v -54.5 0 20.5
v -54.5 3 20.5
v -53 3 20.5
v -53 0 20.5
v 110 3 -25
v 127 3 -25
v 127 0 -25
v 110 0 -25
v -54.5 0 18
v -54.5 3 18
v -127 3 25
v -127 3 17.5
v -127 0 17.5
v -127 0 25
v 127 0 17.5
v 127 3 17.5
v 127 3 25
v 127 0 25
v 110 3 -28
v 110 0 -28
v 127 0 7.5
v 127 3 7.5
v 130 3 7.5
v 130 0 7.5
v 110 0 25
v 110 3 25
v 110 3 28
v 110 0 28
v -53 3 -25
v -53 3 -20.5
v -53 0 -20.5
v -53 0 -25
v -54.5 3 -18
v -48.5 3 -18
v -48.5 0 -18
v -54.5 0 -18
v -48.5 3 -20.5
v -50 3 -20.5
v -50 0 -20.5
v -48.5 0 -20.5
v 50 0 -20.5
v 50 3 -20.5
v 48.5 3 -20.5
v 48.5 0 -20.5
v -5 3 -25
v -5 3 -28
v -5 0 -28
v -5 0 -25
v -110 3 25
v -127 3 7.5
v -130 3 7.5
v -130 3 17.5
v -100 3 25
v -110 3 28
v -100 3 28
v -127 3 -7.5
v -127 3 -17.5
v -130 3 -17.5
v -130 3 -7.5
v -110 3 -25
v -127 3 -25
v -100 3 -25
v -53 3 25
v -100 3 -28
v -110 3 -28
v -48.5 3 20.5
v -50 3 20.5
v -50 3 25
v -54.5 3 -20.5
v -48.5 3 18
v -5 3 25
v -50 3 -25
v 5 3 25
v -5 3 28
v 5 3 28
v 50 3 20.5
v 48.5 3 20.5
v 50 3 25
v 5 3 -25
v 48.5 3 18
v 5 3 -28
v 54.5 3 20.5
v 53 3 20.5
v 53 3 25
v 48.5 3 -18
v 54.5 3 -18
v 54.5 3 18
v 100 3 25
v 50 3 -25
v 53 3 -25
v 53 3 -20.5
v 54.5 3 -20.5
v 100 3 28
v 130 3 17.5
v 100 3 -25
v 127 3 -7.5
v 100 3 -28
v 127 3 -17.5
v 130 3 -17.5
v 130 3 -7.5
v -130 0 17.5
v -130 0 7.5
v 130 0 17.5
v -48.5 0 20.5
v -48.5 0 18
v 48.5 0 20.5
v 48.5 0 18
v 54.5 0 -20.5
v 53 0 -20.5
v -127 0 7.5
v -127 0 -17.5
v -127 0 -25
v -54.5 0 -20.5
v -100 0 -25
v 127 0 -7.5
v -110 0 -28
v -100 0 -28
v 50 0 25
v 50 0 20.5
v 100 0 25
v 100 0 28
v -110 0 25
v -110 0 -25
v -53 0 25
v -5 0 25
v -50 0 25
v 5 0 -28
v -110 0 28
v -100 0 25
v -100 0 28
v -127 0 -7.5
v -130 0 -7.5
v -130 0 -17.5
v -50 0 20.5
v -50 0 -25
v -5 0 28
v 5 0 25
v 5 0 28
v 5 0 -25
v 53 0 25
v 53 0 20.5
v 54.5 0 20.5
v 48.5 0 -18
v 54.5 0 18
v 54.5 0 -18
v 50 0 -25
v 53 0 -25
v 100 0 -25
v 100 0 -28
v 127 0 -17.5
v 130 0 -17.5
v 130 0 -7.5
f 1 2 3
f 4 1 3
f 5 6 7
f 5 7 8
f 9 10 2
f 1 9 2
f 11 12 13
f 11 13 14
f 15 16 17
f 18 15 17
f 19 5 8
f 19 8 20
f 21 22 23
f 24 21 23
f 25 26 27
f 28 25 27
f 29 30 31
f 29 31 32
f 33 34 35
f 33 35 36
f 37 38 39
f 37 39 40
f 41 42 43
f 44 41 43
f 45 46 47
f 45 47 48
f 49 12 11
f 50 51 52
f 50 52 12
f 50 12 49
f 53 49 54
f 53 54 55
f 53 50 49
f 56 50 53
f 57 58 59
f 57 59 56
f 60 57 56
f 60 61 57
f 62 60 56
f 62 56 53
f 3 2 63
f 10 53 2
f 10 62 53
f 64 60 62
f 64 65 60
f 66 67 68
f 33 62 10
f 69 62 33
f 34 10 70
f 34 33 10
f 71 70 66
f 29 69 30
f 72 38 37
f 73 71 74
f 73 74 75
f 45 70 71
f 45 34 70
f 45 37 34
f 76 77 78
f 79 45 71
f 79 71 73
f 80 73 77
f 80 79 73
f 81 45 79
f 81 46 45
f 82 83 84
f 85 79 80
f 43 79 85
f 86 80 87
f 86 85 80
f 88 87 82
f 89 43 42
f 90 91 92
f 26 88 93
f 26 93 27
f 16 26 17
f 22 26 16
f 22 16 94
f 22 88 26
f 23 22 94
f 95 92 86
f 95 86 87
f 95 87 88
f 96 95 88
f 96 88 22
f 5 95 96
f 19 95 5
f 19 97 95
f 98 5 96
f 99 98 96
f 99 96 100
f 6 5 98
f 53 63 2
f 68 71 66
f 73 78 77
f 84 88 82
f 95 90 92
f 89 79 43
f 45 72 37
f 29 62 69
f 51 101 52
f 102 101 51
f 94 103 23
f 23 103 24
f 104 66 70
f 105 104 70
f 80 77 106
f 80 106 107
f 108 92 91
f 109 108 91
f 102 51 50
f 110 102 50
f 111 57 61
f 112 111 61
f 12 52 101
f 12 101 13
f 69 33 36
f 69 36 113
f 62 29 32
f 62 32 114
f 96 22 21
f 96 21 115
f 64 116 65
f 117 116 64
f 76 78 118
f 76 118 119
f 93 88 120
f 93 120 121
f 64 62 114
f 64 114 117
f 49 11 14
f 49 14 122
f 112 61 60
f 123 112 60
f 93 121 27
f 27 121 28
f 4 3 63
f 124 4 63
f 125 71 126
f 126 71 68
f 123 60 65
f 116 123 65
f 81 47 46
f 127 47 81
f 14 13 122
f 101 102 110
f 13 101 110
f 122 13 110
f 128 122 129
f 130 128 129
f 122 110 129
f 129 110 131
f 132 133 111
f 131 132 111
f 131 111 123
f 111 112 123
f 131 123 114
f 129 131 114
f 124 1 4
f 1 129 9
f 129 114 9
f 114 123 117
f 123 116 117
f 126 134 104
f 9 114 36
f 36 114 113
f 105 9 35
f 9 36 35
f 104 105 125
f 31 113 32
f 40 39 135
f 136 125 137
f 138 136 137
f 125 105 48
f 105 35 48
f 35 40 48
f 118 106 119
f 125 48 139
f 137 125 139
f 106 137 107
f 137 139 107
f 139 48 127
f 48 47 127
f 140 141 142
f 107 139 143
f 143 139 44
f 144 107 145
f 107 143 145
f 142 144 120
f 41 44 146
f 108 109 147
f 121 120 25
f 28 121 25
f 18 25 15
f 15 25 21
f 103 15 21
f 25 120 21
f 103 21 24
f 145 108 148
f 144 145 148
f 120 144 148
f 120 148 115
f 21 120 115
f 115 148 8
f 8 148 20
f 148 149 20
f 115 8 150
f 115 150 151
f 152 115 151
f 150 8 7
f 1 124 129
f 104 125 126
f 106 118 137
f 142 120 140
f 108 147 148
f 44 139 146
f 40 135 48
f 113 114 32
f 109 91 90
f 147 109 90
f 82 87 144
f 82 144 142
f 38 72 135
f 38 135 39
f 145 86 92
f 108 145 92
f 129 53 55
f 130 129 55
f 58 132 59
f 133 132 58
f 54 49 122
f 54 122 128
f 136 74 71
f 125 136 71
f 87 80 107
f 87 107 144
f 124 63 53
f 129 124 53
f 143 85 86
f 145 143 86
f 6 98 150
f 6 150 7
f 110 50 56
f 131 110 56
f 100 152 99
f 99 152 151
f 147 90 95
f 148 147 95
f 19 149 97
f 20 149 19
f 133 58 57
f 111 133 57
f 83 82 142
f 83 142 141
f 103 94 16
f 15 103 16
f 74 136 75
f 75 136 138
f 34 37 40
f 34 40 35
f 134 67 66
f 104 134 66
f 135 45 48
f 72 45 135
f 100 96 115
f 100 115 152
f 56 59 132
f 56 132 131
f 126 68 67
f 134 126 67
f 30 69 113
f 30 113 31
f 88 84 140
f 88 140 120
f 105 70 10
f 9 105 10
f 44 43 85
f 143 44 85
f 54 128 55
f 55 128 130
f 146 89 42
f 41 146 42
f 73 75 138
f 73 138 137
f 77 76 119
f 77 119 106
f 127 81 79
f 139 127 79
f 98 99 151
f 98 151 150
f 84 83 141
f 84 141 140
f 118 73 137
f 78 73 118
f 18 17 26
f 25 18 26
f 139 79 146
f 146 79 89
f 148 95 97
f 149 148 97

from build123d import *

# Parameters (mm, degrees)
SKETCH2_W           = 260
SKETCH2_H           = 56
BOSS_EXTRUDE1_DEPTH = 3
SKETCH4_W           = 3
SKETCH4_H           = 15
CUT_EXTRUDE1_DEPTH  = 134.015036744


with BuildPart() as part:
    # Sketch2 → Boss-Extrude1 (new body)
    with BuildSketch(Plane(origin=(0, 0, 0), x_dir=(1, 0, 0), z_dir=(0, 1, 0))):
        Rectangle(SKETCH2_W, SKETCH2_H)
    extrude(amount=BOSS_EXTRUDE1_DEPTH)

    # Sketch4 → Cut-Extrude1 (cut, through all)
    with BuildSketch(Plane(origin=(0, 3, 0), x_dir=(1, 0, 0), z_dir=(0, 1, 0))):
        with Locations((-128.5, 0)):
            Rectangle(SKETCH4_W, SKETCH4_H)
        Polygon((-50, 25), (-50, 20.5), (-48.5, 20.5), (-48.5, 18), (-54.5, 18), (-54.5, 20.5), (-53, 20.5), (-53, 25), (-100, 25), (-100, 28), (-5, 28), (-5, 25), align=None)
        Polygon((-130, 28), (-130, 17.5), (-127, 17.5), (-127, 25), (-110, 25), (-110, 28), align=None)
        Polygon((110, 28), (130, 28), (130, 17.5), (127, 17.5), (127, 25), (110, 25), align=None)
        Polygon((5, 28), (5, 25), (50, 25), (50, 20.5), (48.5, 20.5), (48.5, 18), (54.5, 18), (54.5, 20.5), (53, 20.5), (53, 25), (100, 25), (100, 28), align=None)
        with Locations((128.5, 0)):
            Rectangle(SKETCH4_W, SKETCH4_H)
        Polygon((50, -25), (50, -20.5), (48.5, -20.5), (48.5, -18), (54.5, -18), (54.5, -20.5), (53, -20.5), (53, -25), (100, -25), (100, -28), (5, -28), (5, -25), align=None)
        Polygon((130, -28), (130, -17.5), (127, -17.5), (127, -25), (110, -25), (110, -28), align=None)
        Polygon((-110, -28), (-130, -28), (-130, -17.5), (-127, -17.5), (-127, -25), (-110, -25), align=None)
        Polygon((-5, -28), (-5, -25), (-50, -25), (-50, -20.5), (-48.5, -20.5), (-48.5, -18), (-54.5, -18), (-54.5, -20.5), (-53, -20.5), (-53, -25), (-100, -25), (-100, -28), align=None)
    extrude(amount=-CUT_EXTRUDE1_DEPTH, mode=Mode.SUBTRACT)


solid = part.part
